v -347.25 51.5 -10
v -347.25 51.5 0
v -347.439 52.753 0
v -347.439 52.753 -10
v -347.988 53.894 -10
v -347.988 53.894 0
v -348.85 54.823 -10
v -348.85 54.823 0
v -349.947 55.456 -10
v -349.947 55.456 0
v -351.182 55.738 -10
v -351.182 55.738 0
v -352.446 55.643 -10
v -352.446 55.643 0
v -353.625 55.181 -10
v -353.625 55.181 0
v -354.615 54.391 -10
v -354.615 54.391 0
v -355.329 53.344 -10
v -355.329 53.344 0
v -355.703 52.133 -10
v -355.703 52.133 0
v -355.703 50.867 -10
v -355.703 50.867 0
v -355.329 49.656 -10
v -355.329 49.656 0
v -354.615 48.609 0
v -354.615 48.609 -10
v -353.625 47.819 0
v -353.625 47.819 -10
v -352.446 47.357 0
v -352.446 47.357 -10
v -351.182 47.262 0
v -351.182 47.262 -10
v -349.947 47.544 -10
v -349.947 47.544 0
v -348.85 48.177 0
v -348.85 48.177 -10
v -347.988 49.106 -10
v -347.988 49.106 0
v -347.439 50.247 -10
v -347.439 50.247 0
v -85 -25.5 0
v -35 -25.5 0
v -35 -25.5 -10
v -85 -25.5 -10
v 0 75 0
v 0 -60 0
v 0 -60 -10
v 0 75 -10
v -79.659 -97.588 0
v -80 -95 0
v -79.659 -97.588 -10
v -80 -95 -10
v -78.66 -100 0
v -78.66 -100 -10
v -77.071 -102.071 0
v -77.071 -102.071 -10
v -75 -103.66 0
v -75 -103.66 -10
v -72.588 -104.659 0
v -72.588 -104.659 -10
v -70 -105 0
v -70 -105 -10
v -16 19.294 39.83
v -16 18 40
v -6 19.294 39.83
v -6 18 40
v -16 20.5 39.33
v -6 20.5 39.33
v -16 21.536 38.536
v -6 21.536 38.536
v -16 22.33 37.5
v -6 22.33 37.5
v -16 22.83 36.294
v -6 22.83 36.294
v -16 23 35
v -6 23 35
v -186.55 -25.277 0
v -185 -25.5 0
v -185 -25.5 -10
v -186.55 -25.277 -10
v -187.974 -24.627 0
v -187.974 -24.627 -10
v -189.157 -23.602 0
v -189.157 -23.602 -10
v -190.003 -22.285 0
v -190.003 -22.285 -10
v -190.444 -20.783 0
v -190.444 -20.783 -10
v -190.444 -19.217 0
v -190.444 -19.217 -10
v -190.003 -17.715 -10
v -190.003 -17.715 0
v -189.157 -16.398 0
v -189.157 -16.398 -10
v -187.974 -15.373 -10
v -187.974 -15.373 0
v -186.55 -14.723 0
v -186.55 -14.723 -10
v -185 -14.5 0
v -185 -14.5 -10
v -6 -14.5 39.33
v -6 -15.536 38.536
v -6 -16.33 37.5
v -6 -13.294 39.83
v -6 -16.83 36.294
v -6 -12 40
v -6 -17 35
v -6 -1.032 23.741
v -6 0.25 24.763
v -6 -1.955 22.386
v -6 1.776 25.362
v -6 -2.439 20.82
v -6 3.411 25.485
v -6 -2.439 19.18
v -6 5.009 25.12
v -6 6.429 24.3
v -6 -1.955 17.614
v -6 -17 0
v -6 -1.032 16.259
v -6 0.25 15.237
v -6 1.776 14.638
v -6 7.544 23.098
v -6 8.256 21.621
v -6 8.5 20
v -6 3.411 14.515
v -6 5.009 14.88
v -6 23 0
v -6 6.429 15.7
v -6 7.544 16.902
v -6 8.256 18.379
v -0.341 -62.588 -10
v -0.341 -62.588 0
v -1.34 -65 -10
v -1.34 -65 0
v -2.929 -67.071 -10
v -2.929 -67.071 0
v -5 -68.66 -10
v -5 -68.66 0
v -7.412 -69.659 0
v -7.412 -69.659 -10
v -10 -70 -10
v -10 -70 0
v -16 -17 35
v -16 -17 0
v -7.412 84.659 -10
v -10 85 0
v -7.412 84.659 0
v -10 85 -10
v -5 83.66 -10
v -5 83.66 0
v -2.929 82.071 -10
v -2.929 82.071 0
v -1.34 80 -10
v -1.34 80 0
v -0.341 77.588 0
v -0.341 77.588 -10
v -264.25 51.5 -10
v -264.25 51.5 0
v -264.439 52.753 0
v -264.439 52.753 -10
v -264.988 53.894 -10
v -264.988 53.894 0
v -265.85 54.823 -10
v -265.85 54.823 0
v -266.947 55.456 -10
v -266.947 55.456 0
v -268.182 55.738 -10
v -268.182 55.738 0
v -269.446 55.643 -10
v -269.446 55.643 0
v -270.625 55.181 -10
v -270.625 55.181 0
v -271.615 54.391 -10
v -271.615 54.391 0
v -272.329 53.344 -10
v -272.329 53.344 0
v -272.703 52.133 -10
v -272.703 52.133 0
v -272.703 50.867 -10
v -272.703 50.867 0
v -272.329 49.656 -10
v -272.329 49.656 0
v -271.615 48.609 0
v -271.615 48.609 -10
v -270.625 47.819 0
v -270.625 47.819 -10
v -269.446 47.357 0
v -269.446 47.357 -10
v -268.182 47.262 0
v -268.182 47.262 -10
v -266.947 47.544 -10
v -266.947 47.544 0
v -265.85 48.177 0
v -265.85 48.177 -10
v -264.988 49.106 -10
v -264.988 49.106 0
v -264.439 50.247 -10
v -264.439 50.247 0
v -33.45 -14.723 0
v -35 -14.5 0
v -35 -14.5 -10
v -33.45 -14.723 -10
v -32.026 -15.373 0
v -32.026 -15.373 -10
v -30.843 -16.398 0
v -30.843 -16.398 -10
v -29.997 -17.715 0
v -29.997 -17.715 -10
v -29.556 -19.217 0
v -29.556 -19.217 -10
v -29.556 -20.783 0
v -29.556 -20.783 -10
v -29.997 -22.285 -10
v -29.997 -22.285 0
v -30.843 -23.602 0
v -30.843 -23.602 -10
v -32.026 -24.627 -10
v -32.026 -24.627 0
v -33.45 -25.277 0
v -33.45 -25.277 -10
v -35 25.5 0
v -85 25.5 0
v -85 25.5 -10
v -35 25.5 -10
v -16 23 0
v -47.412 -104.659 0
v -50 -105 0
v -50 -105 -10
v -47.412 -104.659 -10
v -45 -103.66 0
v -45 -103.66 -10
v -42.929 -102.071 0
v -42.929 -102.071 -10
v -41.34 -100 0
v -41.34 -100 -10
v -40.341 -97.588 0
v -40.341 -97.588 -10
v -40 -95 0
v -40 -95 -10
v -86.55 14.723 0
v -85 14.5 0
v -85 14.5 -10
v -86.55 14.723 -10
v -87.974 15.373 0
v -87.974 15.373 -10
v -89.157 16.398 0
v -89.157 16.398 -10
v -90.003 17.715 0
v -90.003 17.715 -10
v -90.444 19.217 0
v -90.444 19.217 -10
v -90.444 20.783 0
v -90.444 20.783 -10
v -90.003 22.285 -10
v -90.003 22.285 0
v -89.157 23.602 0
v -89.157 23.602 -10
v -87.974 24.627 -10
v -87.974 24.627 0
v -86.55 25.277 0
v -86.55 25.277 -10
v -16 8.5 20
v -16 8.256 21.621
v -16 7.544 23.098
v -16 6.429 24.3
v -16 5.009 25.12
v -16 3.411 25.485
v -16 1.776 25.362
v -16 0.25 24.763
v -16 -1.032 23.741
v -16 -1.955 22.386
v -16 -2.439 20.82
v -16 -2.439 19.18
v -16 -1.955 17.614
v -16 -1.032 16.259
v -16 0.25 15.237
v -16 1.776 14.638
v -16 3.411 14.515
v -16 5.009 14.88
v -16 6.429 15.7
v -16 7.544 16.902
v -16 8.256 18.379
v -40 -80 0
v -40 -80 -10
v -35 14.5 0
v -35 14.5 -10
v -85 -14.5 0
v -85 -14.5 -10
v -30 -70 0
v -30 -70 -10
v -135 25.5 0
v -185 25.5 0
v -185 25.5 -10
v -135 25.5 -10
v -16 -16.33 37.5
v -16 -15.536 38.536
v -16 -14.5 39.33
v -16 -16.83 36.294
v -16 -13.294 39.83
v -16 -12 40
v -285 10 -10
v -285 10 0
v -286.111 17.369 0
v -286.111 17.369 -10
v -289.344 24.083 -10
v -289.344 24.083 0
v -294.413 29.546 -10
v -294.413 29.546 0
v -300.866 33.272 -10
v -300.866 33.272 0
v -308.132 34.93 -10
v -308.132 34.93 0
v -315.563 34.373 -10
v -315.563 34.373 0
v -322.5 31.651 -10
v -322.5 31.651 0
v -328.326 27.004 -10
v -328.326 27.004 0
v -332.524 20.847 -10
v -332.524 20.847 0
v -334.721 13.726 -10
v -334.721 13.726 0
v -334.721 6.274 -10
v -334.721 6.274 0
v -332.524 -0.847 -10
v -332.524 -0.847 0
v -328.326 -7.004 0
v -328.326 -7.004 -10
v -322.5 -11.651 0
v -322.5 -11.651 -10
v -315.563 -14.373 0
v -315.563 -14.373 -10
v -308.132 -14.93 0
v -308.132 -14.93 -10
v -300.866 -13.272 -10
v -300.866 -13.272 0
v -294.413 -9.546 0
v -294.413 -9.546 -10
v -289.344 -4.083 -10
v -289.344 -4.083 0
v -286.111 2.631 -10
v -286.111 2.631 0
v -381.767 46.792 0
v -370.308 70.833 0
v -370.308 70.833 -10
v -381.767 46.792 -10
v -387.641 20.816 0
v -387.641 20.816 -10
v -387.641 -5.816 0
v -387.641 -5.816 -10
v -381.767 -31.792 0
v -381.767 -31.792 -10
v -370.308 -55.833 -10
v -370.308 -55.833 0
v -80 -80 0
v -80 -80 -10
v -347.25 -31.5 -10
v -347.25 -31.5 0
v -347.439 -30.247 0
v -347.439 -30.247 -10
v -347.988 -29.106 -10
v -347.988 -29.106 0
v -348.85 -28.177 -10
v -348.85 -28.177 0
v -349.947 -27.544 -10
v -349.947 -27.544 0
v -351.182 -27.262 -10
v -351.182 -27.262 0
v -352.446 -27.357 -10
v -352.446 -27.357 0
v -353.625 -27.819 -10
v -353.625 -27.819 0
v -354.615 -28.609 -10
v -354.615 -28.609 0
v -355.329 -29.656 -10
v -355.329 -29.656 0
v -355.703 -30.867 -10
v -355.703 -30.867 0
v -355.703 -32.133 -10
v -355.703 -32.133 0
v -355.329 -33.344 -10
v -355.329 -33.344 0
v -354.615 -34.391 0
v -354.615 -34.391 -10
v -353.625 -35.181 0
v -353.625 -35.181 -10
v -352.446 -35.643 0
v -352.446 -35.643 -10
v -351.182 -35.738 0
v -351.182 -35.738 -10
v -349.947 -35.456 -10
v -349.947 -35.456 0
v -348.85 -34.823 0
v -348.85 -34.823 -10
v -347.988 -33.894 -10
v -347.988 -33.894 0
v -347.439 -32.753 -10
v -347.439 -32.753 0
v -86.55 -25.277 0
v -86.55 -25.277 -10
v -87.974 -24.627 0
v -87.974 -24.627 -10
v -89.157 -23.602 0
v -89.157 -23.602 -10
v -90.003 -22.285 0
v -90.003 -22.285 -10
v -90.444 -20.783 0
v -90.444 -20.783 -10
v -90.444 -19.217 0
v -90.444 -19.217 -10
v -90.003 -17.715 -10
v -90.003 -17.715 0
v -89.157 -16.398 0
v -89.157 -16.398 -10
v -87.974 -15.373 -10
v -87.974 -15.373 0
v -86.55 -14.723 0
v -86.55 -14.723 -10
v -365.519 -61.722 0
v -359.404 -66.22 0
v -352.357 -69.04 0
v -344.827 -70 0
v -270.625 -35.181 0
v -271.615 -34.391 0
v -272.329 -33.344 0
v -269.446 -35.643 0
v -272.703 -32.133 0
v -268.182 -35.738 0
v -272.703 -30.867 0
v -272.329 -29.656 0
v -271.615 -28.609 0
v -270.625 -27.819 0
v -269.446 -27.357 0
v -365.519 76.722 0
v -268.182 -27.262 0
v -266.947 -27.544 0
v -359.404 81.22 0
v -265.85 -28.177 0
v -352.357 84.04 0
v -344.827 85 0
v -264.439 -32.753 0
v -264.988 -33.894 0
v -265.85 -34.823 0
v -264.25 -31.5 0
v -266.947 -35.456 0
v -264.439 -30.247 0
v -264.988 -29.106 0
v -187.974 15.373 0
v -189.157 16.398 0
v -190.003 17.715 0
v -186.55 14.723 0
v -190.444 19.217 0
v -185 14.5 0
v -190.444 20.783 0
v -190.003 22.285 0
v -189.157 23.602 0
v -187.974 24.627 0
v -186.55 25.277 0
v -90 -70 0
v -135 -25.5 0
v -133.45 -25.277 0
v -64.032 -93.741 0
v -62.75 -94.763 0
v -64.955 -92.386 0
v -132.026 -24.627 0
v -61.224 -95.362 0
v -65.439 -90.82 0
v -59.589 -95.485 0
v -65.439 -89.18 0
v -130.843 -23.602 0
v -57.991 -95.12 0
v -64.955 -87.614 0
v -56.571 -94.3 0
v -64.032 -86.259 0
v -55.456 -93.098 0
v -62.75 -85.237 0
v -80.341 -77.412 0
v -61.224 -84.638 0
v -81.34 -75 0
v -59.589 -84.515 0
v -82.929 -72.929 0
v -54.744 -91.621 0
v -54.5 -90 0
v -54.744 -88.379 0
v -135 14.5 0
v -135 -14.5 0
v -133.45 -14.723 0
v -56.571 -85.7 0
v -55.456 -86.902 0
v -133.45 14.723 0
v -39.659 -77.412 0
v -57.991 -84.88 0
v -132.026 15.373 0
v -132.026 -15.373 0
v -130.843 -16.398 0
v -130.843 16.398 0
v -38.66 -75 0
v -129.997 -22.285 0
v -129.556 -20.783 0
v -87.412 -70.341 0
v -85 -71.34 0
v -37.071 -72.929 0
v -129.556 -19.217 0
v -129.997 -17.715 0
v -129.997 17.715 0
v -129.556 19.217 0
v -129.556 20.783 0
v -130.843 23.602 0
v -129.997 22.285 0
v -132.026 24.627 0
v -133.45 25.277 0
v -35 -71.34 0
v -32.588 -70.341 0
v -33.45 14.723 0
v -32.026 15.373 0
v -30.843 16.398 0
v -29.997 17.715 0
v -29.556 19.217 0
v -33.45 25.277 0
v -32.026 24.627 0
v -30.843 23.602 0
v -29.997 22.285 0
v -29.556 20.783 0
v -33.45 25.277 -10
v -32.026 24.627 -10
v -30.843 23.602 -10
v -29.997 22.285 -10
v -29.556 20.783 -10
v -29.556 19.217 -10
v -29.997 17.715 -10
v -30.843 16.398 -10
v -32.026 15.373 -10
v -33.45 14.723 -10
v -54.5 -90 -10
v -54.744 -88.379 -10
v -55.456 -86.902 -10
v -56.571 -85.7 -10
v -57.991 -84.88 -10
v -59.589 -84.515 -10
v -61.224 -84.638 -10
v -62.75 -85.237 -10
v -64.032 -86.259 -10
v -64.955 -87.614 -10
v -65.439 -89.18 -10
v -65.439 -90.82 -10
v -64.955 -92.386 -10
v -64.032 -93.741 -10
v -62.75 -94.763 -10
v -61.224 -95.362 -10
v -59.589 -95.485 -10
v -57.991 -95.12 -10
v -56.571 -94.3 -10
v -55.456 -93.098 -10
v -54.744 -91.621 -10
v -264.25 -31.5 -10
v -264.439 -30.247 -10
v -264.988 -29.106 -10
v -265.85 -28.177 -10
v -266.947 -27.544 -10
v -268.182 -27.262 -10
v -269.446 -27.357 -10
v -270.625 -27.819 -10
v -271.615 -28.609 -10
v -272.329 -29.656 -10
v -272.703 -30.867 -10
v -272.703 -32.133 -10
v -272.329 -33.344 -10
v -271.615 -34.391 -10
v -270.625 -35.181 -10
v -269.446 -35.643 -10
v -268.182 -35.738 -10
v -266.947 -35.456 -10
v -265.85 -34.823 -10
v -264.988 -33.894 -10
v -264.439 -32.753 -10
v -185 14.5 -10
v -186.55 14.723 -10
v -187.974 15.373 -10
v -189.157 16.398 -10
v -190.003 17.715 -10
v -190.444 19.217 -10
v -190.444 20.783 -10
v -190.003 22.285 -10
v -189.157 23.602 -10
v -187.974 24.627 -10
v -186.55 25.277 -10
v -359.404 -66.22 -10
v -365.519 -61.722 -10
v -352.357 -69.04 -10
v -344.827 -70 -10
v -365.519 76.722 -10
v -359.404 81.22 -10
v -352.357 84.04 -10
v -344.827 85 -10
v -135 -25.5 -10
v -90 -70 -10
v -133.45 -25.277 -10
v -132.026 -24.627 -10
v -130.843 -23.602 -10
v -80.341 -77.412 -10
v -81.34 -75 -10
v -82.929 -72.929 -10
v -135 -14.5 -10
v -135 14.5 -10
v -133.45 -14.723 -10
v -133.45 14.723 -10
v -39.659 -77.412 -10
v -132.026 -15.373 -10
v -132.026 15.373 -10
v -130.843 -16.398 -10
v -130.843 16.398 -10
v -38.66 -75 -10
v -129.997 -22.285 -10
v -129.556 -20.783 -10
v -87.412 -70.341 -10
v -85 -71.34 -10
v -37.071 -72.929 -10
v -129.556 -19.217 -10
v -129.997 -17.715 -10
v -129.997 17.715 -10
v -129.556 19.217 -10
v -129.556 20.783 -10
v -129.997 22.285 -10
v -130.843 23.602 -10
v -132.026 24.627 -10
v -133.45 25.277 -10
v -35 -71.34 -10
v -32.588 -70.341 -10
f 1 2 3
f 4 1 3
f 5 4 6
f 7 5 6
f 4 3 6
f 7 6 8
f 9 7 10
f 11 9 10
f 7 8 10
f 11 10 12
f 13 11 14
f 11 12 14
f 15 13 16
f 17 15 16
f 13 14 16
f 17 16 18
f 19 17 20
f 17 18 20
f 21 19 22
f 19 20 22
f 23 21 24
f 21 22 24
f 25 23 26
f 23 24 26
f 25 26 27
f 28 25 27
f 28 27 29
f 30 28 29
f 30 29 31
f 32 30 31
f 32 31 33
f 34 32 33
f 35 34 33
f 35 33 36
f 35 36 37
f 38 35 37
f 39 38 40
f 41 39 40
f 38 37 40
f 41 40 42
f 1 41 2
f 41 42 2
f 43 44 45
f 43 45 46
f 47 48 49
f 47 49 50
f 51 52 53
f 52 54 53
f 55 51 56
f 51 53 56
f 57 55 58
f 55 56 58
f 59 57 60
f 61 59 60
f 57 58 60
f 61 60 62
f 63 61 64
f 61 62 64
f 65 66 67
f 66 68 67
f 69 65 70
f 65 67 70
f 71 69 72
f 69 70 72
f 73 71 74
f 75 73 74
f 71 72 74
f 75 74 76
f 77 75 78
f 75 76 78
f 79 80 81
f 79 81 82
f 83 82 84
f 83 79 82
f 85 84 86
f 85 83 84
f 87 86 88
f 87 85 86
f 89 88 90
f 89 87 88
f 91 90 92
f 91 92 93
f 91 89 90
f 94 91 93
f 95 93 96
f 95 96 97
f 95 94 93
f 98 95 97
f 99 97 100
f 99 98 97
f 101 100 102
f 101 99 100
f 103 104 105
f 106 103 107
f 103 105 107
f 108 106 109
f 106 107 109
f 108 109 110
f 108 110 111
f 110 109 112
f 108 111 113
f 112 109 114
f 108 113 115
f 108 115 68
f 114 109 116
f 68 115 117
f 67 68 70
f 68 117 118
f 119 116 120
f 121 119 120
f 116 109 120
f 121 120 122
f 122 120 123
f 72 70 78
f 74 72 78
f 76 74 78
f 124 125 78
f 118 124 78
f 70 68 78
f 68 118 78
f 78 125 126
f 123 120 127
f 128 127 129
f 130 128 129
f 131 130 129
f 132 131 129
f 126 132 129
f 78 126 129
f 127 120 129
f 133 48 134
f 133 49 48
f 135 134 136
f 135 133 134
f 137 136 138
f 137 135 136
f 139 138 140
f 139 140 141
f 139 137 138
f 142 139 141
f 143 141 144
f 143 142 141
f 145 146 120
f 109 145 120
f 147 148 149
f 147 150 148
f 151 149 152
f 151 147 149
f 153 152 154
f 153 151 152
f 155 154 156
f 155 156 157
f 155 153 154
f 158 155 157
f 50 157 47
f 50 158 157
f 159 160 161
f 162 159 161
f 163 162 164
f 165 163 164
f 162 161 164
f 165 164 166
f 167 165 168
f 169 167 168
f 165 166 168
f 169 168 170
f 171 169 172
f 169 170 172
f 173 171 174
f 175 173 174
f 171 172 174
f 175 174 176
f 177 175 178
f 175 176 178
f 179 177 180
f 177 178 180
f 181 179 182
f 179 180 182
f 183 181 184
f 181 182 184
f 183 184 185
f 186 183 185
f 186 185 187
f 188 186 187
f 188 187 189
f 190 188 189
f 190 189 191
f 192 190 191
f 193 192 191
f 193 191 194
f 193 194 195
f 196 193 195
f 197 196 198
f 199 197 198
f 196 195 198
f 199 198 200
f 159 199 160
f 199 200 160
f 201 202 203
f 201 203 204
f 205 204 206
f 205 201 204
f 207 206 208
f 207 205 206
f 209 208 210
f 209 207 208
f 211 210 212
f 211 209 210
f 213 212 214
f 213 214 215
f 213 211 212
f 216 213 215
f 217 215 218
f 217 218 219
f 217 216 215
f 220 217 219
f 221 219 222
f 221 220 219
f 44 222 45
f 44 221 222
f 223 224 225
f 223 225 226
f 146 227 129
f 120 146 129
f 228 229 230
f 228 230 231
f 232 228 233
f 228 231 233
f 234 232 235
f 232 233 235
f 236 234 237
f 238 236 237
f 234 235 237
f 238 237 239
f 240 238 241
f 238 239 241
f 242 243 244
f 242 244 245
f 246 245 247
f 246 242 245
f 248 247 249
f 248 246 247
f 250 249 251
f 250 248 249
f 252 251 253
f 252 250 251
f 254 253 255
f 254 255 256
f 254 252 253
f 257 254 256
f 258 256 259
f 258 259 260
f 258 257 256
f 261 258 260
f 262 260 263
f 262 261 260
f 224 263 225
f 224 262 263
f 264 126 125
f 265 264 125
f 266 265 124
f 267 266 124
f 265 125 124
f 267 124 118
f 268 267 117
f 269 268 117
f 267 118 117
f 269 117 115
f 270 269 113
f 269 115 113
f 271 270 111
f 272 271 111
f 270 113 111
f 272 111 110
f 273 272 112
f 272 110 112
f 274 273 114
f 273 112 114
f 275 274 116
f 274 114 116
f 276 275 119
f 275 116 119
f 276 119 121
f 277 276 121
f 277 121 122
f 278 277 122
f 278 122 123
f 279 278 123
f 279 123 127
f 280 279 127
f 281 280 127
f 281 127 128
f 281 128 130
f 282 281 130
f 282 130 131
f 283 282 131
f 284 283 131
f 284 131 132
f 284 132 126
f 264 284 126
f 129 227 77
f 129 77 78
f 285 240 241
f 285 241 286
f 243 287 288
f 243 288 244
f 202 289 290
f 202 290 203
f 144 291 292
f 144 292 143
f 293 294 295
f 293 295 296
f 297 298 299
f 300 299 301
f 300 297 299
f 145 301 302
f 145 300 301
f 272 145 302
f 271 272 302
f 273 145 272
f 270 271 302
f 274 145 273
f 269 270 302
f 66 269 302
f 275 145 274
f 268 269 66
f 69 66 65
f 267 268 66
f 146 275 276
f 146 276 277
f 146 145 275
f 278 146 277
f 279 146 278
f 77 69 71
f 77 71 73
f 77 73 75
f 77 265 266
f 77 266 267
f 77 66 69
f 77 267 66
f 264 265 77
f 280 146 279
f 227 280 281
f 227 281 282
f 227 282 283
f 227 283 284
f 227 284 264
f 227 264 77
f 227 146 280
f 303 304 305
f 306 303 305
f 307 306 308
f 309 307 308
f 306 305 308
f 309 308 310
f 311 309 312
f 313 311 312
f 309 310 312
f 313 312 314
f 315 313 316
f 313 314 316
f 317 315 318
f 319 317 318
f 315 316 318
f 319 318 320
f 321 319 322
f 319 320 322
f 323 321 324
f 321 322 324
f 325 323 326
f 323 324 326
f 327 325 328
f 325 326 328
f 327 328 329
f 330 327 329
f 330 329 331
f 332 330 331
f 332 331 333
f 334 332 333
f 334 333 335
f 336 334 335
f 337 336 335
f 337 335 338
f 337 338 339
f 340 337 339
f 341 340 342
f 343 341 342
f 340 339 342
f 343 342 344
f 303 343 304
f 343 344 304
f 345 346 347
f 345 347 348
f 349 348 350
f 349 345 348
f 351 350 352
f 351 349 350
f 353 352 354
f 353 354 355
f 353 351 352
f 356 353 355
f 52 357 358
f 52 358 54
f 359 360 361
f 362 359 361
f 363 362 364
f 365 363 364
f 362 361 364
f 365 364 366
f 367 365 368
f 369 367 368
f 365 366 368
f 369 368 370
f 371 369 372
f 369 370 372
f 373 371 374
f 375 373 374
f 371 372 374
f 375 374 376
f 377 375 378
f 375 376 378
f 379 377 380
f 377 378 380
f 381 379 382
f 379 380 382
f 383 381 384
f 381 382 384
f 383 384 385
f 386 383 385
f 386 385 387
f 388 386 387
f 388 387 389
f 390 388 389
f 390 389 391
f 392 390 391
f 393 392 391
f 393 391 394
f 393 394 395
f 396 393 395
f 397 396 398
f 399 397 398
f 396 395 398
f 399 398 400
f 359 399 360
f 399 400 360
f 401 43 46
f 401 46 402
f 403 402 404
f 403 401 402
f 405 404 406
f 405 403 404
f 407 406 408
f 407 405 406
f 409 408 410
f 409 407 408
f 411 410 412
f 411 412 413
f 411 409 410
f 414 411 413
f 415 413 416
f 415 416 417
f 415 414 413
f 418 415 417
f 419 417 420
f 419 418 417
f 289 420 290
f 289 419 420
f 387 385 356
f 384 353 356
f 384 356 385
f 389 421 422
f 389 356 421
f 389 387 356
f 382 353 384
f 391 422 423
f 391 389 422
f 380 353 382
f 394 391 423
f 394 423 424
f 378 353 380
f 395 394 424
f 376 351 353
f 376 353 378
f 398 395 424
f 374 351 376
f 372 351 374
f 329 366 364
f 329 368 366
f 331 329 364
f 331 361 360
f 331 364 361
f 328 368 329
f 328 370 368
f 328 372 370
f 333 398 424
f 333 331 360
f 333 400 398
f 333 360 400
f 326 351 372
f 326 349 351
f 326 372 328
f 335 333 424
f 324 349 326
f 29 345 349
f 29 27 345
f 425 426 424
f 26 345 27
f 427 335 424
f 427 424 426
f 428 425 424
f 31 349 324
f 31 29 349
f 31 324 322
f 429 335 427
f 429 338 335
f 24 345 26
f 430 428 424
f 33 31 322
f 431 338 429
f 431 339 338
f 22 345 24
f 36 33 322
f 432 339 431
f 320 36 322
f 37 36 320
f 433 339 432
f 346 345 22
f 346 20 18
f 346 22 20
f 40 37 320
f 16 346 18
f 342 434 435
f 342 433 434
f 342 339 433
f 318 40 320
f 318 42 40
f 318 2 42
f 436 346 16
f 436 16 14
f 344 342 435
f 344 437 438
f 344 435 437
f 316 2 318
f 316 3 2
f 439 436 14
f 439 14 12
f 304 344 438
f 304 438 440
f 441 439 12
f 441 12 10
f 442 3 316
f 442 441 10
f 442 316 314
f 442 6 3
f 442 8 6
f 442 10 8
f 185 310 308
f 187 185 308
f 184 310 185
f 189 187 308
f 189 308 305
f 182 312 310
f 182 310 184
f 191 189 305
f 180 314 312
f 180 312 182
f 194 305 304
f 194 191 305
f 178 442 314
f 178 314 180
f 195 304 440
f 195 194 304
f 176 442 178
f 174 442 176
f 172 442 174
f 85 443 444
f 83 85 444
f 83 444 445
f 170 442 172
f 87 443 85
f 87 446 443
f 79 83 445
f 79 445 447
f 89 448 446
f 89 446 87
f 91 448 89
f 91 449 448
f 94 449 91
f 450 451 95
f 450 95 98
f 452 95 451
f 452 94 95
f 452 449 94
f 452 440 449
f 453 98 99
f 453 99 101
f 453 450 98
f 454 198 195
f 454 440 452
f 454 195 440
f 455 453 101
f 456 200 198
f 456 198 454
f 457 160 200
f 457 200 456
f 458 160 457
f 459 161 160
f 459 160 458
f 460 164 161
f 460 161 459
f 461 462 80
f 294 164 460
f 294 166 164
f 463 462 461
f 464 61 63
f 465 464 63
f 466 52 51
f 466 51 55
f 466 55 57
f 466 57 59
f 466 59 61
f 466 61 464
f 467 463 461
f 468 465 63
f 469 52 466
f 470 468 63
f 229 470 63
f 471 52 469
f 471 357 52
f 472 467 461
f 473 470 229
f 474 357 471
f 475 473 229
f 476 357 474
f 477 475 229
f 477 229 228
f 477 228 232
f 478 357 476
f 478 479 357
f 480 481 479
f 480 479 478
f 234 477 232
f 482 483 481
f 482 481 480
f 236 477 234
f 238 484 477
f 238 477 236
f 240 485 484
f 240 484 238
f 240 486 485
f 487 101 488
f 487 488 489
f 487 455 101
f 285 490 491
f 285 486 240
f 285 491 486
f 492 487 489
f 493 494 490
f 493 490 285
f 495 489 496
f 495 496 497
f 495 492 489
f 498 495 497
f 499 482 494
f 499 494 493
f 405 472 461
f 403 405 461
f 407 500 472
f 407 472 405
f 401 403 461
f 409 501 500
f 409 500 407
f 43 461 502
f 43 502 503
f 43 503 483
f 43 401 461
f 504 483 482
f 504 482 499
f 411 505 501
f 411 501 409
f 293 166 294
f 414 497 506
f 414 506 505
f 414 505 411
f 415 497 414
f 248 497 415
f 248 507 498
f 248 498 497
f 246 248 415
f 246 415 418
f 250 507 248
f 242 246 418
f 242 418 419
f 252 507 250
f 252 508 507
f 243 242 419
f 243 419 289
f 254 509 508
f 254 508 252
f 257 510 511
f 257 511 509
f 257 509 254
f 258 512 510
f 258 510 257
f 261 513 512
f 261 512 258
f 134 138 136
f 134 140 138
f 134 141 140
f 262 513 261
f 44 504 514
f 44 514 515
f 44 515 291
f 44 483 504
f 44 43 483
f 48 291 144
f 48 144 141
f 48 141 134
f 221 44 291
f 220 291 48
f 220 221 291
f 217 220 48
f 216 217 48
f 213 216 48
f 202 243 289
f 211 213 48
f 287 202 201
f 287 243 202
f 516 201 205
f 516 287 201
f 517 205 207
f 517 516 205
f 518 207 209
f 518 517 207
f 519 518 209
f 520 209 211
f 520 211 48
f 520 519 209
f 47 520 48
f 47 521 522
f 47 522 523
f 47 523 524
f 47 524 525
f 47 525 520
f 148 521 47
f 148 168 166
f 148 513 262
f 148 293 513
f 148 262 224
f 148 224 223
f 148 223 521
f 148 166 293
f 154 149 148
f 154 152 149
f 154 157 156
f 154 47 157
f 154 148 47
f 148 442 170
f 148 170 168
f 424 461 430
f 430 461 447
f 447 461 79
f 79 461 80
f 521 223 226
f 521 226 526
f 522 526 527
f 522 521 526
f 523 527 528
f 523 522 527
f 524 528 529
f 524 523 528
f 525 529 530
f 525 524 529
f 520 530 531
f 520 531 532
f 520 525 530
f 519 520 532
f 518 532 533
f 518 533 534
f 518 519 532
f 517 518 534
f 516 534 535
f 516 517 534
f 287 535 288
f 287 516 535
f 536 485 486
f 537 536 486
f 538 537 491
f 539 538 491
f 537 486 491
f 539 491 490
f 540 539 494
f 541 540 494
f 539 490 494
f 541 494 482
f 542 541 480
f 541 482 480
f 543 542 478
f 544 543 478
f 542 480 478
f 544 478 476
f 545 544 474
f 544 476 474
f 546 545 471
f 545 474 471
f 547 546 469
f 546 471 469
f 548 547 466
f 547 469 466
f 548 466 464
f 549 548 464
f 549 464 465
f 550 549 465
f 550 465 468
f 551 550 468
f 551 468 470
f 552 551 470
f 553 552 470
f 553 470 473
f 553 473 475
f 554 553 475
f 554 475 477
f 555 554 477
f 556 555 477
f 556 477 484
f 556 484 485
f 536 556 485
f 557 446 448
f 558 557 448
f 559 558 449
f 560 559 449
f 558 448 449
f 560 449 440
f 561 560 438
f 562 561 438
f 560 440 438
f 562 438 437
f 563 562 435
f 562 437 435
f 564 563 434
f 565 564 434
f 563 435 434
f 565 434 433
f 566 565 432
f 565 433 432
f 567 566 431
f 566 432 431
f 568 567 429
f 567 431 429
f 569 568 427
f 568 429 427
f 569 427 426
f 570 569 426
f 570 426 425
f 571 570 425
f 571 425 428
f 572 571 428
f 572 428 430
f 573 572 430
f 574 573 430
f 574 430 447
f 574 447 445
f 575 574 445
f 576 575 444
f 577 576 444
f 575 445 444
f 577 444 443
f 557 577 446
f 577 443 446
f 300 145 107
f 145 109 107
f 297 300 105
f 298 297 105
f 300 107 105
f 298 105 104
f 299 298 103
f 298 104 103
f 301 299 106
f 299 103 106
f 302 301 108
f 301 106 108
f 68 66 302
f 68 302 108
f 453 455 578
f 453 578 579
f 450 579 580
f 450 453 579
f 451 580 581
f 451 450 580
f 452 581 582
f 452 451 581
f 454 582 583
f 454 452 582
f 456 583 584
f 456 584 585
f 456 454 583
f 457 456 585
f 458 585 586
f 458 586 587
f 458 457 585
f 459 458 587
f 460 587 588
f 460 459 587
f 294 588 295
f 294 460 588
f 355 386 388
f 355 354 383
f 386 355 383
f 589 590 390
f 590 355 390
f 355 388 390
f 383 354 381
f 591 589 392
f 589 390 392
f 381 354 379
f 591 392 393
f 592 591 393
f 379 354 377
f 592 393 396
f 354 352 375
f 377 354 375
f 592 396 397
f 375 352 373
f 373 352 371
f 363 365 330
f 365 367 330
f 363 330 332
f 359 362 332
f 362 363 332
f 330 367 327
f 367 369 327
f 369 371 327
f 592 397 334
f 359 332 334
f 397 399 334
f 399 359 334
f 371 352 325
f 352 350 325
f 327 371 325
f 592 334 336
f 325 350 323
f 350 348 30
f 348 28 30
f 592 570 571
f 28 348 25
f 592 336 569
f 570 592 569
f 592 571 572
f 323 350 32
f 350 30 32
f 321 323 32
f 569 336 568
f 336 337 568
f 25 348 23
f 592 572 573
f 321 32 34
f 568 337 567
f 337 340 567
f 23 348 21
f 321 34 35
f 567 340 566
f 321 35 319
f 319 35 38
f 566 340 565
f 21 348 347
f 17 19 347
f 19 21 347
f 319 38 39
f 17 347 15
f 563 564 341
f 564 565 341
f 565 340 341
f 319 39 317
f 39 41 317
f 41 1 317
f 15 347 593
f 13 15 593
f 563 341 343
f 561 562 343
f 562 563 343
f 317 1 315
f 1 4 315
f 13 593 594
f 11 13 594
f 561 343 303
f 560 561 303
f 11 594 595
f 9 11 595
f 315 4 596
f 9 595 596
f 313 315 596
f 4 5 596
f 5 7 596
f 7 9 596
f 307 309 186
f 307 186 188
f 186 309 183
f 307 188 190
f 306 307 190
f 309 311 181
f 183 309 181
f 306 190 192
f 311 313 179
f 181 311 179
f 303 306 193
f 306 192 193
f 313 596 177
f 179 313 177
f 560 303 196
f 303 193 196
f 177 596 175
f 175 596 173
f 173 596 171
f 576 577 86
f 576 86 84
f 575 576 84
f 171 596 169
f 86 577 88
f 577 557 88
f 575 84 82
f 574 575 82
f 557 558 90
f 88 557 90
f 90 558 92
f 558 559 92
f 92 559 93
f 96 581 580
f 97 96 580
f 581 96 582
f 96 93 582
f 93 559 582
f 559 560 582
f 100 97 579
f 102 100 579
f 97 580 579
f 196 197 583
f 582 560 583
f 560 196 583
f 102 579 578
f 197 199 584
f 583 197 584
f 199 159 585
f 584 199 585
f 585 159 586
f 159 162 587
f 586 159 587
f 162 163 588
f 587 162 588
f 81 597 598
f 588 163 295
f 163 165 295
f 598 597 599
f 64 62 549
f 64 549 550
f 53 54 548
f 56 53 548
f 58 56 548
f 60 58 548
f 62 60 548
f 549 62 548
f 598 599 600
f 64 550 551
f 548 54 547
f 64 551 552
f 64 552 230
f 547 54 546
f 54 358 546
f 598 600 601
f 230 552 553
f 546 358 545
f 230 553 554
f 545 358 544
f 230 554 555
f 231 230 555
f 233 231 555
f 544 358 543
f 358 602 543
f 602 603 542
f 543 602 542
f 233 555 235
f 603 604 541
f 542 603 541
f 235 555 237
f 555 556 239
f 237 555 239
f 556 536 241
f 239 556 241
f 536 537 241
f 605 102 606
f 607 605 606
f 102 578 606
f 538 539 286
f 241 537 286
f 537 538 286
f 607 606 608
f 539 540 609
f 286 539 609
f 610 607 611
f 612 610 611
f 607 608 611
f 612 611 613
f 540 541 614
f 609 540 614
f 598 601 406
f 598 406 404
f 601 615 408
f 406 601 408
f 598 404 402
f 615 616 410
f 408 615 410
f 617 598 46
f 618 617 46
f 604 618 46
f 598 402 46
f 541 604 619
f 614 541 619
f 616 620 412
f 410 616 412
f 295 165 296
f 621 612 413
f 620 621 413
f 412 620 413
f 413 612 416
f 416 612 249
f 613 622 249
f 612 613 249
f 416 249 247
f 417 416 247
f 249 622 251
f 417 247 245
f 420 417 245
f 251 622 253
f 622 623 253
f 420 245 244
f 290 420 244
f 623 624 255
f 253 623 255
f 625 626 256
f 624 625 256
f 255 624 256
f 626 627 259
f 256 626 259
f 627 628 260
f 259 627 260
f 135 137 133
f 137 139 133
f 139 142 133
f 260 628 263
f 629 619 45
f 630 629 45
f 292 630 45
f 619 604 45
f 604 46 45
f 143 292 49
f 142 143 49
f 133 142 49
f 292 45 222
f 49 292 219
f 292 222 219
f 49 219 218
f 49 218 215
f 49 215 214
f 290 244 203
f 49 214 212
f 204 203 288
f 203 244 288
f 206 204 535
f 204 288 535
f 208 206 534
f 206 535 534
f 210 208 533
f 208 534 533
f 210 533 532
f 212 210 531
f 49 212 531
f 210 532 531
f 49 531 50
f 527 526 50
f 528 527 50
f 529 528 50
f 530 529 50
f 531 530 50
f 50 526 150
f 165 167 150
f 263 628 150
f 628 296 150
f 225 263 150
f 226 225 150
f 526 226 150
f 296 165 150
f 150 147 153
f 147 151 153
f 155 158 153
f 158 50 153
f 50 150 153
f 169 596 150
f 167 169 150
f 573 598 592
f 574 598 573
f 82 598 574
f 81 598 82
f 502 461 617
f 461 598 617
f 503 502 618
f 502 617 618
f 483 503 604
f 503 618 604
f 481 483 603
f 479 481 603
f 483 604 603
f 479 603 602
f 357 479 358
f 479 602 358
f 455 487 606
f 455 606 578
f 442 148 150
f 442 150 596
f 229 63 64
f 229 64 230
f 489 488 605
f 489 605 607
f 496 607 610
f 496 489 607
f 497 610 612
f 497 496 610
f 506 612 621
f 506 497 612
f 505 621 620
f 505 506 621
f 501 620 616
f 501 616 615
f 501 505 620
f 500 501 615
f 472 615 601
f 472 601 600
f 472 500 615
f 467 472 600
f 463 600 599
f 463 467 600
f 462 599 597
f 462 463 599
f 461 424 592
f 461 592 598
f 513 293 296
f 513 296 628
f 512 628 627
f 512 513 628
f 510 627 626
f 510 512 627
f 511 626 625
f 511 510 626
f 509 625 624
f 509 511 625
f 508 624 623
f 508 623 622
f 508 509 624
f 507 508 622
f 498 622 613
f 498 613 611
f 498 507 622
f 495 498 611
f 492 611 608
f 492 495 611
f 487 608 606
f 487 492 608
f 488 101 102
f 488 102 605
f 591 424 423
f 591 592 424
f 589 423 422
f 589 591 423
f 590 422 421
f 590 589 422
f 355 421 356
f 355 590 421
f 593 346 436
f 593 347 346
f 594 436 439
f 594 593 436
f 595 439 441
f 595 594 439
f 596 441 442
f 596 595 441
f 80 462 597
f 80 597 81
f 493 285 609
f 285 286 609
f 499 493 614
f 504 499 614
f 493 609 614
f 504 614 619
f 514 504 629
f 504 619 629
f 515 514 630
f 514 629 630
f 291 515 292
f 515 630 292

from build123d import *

# Parameters (mm, degrees)
TABAN_FLAN_1_DEPTH          = 10
IZIM2_R                     = 25
IZIM2_R_2                   = 4.25
KES_EKSTR_ZYON1_DEPTH       = 10
IZIM3_R                     = 5.5
KES_EKSTR_ZYON2_DEPTH       = 20
IZIM4_W                     = 10
IZIM4_H                     = 40
Y_KSEKLIK_EKSTR_ZYON1_DEPTH = 40
IZIM5_R                     = 5.5
KES_EKSTR_ZYON3_DEPTH       = 40
RADYUS3_R                   = 5
RADYUS5_R                   = 10
RADYUS6_R                   = 30
RADYUS7_R                   = 10


# Sheet-metal steps are written as plain solids
with BuildPart() as part:
    # Çizim1 → Taban-Flanş1 (new body)
    with BuildSketch(Plane.XY):
        with BuildLine():
            Line((-360, -70), (-250, -70))
            Line((-250, -70), (-200, -70))
            Line((-200, -70), (-80, -70))
            Line((-80, -70), (-80, -105))
            Line((-80, -105), (-40, -105))
            Line((-40, -105), (-40, -70))
            Line((-40, -70), (0, -70))
            Line((0, -70), (0, 0))
            Line((0, 0), (0, 85))
            Line((0, 85), (-360, 85))
            ThreePointArc((-360, 85), (-388.382588991, 7.5), (-360, -70))
        make_face()
    extrude(amount=-TABAN_FLAN_1_DEPTH)

    # Çizim2 → Kes-Ekstrüzyon1 (cut)
    with BuildSketch(Plane.XY):
        with Locations((-310, 10)):
            Circle(IZIM2_R)
        with Locations((-351.5, 51.5)):
            Circle(IZIM2_R_2)
        with Locations((-268.5, 51.5)):
            Circle(IZIM2_R_2)
        with Locations((-351.5, -31.5)):
            Circle(IZIM2_R_2)
        with Locations((-268.5, -31.5)):
            Circle(IZIM2_R_2)
        with BuildLine():
            Line((-85, 25.5), (-35, 25.5))
            ThreePointArc((-35, 25.5), (-29.5, 20), (-35, 14.5))
            Line((-35, 14.5), (-85, 14.5))
            ThreePointArc((-85, 14.5), (-90.5, 20), (-85, 25.5))
        make_face()
        with BuildLine():
            Line((-85, -14.5), (-35, -14.5))
            ThreePointArc((-35, -14.5), (-29.5, -20), (-35, -25.5))
            Line((-35, -25.5), (-85, -25.5))
            ThreePointArc((-85, -25.5), (-90.5, -20), (-85, -14.5))
        make_face()
        with BuildLine():
            Line((-185, 25.5), (-135, 25.5))
            ThreePointArc((-135, 25.5), (-129.5, 20), (-135, 14.5))
            Line((-135, 14.5), (-185, 14.5))
            ThreePointArc((-185, 14.5), (-190.5, 20), (-185, 25.5))
        make_face()
        with BuildLine():
            Line((-185, -14.5), (-135, -14.5))
            ThreePointArc((-135, -14.5), (-129.5, -20), (-135, -25.5))
            Line((-135, -25.5), (-185, -25.5))
            ThreePointArc((-185, -25.5), (-190.5, -20), (-185, -14.5))
        make_face()
    extrude(amount=-KES_EKSTR_ZYON1_DEPTH, mode=Mode.SUBTRACT)

    # Çizim3 → Kes-Ekstrüzyon2 (cut)
    with BuildSketch(Plane.XY):
        with Locations((-60, -90)):
            Circle(IZIM3_R)
    extrude(amount=-KES_EKSTR_ZYON2_DEPTH, mode=Mode.SUBTRACT)

    # Radyus5
    radyus5_edges = [part.edges().sort_by_distance(p)[0] for p in [
        (-40, -70, -5),
        (-40, -105, -5),
        (-80, -105, -5),
        (-80, -70, -5),
    ]]
    fillet(radyus5_edges, radius=RADYUS5_R)

    # Radyus6
    radyus6_edges = [part.edges().sort_by_distance(p)[0] for p in [
        (-360, -70, -5),
        (-360, 85, -5),
    ]]
    fillet(radyus6_edges, radius=RADYUS6_R)

    # Radyus7
    radyus7_edges = [part.edges().sort_by_distance(p)[0] for p in [
        (0, -70, -5),
        (0, 85, -5),
    ]]
    fillet(radyus7_edges, radius=RADYUS7_R)


with BuildPart() as body_2:
    # Çizim4 → Yükseklik-Ekstrüzyon1 (new body)
    with BuildSketch(Plane.XY):
        with Locations((-11, 3)):
            Rectangle(IZIM4_W, IZIM4_H)
    extrude(amount=Y_KSEKLIK_EKSTR_ZYON1_DEPTH)

    # Çizim5 → Kes-Ekstrüzyon3 (cut)
    with BuildSketch(Plane(origin=(-6, 0, 0), x_dir=(0, 0, -1), z_dir=(1, 0, 0))):
        with Locations(Location((-20, 3, 0), (0, 0, 90))):
            Circle(IZIM5_R)
    extrude(amount=-KES_EKSTR_ZYON3_DEPTH, mode=Mode.SUBTRACT)

    # Radyus3
    radyus3_edges = [body_2.edges().sort_by_distance(p)[0] for p in [
        (-11, -17, 40),
        (-11, 23, 40),
    ]]
    fillet(radyus3_edges, radius=RADYUS3_R)


solid = Compound([part.part, body_2.part])
